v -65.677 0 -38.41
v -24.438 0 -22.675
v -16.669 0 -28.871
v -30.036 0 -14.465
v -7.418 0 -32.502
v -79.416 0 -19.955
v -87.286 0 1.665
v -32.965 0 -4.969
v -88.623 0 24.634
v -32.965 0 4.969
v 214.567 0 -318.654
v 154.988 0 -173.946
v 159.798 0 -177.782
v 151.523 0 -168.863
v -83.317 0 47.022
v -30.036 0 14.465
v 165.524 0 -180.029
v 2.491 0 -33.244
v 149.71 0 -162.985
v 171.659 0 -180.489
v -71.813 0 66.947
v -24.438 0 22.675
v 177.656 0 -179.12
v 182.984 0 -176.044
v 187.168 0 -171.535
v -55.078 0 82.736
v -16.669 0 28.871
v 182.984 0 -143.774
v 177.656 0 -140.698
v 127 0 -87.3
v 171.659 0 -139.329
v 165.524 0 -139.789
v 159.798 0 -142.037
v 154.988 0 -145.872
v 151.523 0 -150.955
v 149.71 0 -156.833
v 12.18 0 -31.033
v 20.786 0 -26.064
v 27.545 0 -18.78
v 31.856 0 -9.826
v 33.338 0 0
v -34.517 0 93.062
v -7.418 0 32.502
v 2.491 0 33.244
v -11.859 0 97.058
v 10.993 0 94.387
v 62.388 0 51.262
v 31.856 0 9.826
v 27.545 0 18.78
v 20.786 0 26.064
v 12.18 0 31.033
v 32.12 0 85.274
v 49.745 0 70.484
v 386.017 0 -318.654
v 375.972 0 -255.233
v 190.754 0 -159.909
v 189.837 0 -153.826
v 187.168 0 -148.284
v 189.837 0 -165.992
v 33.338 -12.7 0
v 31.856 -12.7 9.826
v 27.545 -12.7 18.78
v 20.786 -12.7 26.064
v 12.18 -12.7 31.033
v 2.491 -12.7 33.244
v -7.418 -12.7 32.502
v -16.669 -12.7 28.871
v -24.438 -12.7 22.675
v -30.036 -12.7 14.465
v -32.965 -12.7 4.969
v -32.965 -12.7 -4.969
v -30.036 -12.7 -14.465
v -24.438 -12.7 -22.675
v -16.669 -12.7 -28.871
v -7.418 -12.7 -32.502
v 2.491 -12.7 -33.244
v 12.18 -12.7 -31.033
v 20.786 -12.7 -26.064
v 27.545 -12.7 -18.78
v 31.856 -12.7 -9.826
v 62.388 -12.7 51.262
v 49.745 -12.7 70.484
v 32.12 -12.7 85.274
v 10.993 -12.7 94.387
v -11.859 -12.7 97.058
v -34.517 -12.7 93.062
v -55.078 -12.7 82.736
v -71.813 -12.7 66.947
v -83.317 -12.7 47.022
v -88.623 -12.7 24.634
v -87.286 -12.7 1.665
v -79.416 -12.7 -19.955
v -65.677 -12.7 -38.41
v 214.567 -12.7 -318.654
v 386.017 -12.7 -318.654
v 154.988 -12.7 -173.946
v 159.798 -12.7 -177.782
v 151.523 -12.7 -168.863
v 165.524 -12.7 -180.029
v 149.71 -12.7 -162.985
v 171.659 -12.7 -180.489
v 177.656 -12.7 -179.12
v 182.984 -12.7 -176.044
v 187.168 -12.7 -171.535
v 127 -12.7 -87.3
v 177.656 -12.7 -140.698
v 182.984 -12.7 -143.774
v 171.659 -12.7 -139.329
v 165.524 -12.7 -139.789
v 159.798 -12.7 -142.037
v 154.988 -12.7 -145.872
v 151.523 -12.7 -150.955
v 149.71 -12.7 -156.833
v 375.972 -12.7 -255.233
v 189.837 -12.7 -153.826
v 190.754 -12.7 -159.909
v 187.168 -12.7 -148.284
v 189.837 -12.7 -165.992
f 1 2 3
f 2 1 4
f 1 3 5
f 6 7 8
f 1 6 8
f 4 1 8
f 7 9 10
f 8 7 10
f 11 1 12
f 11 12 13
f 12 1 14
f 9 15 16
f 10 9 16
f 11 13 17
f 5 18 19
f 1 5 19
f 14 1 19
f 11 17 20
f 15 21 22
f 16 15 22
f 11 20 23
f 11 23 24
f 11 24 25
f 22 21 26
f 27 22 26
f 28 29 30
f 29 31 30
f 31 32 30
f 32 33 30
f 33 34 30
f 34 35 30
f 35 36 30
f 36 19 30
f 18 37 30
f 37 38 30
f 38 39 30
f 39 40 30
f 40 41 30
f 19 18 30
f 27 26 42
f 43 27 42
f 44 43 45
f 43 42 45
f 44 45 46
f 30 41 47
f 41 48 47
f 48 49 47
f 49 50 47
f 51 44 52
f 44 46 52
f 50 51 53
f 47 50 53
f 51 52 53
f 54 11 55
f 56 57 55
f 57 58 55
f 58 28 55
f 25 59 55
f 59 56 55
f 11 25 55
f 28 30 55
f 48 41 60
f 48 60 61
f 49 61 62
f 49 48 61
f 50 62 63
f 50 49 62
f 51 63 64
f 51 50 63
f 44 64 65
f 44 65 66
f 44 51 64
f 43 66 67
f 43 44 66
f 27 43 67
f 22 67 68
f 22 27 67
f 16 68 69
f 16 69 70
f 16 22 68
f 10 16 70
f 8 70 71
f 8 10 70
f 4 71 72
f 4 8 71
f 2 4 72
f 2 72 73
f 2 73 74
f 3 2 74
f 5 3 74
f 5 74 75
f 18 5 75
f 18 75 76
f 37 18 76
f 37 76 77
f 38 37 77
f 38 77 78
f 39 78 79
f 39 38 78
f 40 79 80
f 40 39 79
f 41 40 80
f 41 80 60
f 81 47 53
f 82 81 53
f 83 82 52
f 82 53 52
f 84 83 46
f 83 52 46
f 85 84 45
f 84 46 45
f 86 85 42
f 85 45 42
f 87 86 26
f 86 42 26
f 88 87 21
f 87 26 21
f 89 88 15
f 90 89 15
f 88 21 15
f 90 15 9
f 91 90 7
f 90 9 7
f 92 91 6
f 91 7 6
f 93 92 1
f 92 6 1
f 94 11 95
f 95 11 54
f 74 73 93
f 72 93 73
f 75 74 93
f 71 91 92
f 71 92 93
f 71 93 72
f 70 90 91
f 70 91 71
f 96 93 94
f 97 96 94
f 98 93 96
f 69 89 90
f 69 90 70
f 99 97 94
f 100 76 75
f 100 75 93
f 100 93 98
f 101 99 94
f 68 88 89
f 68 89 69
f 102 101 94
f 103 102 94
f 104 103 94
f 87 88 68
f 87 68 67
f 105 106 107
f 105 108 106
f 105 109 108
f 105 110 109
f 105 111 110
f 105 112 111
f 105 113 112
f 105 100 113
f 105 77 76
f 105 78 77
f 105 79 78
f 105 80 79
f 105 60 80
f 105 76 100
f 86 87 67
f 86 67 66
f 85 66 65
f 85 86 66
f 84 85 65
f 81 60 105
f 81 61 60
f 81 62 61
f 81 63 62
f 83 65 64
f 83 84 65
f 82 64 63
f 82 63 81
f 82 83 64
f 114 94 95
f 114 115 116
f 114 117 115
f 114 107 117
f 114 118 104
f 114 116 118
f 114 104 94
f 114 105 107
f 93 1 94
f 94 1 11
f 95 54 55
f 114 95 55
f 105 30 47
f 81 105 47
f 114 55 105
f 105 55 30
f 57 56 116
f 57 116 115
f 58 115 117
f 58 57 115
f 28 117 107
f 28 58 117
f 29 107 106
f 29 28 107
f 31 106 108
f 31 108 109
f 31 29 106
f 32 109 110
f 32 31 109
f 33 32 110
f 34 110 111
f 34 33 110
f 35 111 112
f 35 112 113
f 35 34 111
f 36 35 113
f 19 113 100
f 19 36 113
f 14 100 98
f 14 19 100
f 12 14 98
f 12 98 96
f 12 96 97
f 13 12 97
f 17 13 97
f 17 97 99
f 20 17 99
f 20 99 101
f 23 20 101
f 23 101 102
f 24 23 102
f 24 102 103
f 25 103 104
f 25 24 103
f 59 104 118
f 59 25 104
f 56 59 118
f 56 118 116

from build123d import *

# Parameters (mm, degrees)
F0_R     = 20.6375
F0_R_2   = 33.3375
F1_DEPTH = 12.7


with BuildPart() as f1:
    # F0 (on Front) → F1 (new body)
    with BuildSketch(Plane.XZ):
        with BuildLine():
            Line((127, -87.2998), (62.387785, 51.261542))
            ThreePointArc((62.387785, 51.261542), (-55.078025, 82.736411), (-65.676996, -38.410384))
            Line((-65.676996, -38.410384), (214.566733, -318.654112))
            Line((214.566733, -318.654112), (386.016733, -318.654112))
            Line((386.016733, -318.654112), (375.971888, -255.233459))
            Line((375.971888, -255.233459), (127, -87.2998))
        make_face()
        with Locations((170.116733, -159.909192)):
            Circle(F0_R, mode=Mode.SUBTRACT)
        Circle(F0_R_2, mode=Mode.SUBTRACT)
    extrude(amount=F1_DEPTH)


solid = f1.part
